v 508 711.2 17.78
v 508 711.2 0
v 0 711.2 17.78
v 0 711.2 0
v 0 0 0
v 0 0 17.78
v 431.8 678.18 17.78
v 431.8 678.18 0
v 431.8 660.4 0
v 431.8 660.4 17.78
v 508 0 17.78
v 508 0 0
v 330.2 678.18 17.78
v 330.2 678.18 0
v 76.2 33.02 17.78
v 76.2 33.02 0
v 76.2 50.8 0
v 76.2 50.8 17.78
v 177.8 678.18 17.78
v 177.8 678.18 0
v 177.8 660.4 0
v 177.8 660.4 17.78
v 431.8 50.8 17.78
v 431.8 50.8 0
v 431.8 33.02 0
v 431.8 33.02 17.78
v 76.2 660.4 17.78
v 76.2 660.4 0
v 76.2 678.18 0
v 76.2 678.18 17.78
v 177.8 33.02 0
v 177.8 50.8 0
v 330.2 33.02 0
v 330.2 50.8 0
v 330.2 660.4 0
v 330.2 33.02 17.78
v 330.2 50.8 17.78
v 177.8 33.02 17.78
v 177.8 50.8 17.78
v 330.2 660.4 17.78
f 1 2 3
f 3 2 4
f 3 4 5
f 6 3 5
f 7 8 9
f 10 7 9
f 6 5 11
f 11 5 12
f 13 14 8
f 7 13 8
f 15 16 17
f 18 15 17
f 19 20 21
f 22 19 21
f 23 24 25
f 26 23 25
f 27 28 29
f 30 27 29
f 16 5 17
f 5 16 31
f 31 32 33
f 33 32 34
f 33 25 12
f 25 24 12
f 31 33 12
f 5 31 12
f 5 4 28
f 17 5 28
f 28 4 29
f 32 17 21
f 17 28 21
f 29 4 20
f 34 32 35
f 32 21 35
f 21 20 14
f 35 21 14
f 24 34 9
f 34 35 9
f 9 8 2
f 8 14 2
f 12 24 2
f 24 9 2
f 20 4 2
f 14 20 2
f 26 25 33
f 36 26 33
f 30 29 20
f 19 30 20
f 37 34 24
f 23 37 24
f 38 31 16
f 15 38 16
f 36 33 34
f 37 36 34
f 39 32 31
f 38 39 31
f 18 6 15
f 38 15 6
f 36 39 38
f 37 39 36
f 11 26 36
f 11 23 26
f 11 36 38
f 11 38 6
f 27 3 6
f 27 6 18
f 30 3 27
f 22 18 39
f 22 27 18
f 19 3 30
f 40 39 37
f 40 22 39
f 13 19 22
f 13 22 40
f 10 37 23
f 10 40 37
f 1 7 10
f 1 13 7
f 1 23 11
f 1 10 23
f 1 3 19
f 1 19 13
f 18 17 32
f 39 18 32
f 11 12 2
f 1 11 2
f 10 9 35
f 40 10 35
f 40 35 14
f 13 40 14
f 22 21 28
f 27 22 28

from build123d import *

# Parameters (mm, degrees)
F0_W     = 508
F0_H     = 355.6
F1_DEPTH = 17.78


with BuildPart() as f1:
    # F0 (on Top) → F1 (new body)
    with BuildSketch(Plane.XY):
        with Locations((254, 177.8)):
            Rectangle(F0_W, F0_H)
        Polygon((177.8, 50.8), (177.8, 33.02), (76.2, 33.02), (76.2, 50.8), (127, 50.8), align=None, mode=Mode.SUBTRACT)
        Polygon((330.2, 33.02), (330.2, 50.8), (381, 50.8), (431.8, 50.8), (431.8, 33.02), align=None, mode=Mode.SUBTRACT)
        Polygon((0, 660.4), (0, 355.6), (508, 355.6), (508, 711.2), (254, 711.2), (0, 711.2), align=None)
        Polygon((177.8, 660.4), (127, 660.4), (76.2, 660.4), (76.2, 678.18), (177.8, 678.18), align=None, mode=Mode.SUBTRACT)
        Polygon((431.8, 660.4), (381, 660.4), (330.2, 660.4), (330.2, 678.18), (431.8, 678.18), align=None, mode=Mode.SUBTRACT)
    extrude(amount=F1_DEPTH)


solid = f1.part
